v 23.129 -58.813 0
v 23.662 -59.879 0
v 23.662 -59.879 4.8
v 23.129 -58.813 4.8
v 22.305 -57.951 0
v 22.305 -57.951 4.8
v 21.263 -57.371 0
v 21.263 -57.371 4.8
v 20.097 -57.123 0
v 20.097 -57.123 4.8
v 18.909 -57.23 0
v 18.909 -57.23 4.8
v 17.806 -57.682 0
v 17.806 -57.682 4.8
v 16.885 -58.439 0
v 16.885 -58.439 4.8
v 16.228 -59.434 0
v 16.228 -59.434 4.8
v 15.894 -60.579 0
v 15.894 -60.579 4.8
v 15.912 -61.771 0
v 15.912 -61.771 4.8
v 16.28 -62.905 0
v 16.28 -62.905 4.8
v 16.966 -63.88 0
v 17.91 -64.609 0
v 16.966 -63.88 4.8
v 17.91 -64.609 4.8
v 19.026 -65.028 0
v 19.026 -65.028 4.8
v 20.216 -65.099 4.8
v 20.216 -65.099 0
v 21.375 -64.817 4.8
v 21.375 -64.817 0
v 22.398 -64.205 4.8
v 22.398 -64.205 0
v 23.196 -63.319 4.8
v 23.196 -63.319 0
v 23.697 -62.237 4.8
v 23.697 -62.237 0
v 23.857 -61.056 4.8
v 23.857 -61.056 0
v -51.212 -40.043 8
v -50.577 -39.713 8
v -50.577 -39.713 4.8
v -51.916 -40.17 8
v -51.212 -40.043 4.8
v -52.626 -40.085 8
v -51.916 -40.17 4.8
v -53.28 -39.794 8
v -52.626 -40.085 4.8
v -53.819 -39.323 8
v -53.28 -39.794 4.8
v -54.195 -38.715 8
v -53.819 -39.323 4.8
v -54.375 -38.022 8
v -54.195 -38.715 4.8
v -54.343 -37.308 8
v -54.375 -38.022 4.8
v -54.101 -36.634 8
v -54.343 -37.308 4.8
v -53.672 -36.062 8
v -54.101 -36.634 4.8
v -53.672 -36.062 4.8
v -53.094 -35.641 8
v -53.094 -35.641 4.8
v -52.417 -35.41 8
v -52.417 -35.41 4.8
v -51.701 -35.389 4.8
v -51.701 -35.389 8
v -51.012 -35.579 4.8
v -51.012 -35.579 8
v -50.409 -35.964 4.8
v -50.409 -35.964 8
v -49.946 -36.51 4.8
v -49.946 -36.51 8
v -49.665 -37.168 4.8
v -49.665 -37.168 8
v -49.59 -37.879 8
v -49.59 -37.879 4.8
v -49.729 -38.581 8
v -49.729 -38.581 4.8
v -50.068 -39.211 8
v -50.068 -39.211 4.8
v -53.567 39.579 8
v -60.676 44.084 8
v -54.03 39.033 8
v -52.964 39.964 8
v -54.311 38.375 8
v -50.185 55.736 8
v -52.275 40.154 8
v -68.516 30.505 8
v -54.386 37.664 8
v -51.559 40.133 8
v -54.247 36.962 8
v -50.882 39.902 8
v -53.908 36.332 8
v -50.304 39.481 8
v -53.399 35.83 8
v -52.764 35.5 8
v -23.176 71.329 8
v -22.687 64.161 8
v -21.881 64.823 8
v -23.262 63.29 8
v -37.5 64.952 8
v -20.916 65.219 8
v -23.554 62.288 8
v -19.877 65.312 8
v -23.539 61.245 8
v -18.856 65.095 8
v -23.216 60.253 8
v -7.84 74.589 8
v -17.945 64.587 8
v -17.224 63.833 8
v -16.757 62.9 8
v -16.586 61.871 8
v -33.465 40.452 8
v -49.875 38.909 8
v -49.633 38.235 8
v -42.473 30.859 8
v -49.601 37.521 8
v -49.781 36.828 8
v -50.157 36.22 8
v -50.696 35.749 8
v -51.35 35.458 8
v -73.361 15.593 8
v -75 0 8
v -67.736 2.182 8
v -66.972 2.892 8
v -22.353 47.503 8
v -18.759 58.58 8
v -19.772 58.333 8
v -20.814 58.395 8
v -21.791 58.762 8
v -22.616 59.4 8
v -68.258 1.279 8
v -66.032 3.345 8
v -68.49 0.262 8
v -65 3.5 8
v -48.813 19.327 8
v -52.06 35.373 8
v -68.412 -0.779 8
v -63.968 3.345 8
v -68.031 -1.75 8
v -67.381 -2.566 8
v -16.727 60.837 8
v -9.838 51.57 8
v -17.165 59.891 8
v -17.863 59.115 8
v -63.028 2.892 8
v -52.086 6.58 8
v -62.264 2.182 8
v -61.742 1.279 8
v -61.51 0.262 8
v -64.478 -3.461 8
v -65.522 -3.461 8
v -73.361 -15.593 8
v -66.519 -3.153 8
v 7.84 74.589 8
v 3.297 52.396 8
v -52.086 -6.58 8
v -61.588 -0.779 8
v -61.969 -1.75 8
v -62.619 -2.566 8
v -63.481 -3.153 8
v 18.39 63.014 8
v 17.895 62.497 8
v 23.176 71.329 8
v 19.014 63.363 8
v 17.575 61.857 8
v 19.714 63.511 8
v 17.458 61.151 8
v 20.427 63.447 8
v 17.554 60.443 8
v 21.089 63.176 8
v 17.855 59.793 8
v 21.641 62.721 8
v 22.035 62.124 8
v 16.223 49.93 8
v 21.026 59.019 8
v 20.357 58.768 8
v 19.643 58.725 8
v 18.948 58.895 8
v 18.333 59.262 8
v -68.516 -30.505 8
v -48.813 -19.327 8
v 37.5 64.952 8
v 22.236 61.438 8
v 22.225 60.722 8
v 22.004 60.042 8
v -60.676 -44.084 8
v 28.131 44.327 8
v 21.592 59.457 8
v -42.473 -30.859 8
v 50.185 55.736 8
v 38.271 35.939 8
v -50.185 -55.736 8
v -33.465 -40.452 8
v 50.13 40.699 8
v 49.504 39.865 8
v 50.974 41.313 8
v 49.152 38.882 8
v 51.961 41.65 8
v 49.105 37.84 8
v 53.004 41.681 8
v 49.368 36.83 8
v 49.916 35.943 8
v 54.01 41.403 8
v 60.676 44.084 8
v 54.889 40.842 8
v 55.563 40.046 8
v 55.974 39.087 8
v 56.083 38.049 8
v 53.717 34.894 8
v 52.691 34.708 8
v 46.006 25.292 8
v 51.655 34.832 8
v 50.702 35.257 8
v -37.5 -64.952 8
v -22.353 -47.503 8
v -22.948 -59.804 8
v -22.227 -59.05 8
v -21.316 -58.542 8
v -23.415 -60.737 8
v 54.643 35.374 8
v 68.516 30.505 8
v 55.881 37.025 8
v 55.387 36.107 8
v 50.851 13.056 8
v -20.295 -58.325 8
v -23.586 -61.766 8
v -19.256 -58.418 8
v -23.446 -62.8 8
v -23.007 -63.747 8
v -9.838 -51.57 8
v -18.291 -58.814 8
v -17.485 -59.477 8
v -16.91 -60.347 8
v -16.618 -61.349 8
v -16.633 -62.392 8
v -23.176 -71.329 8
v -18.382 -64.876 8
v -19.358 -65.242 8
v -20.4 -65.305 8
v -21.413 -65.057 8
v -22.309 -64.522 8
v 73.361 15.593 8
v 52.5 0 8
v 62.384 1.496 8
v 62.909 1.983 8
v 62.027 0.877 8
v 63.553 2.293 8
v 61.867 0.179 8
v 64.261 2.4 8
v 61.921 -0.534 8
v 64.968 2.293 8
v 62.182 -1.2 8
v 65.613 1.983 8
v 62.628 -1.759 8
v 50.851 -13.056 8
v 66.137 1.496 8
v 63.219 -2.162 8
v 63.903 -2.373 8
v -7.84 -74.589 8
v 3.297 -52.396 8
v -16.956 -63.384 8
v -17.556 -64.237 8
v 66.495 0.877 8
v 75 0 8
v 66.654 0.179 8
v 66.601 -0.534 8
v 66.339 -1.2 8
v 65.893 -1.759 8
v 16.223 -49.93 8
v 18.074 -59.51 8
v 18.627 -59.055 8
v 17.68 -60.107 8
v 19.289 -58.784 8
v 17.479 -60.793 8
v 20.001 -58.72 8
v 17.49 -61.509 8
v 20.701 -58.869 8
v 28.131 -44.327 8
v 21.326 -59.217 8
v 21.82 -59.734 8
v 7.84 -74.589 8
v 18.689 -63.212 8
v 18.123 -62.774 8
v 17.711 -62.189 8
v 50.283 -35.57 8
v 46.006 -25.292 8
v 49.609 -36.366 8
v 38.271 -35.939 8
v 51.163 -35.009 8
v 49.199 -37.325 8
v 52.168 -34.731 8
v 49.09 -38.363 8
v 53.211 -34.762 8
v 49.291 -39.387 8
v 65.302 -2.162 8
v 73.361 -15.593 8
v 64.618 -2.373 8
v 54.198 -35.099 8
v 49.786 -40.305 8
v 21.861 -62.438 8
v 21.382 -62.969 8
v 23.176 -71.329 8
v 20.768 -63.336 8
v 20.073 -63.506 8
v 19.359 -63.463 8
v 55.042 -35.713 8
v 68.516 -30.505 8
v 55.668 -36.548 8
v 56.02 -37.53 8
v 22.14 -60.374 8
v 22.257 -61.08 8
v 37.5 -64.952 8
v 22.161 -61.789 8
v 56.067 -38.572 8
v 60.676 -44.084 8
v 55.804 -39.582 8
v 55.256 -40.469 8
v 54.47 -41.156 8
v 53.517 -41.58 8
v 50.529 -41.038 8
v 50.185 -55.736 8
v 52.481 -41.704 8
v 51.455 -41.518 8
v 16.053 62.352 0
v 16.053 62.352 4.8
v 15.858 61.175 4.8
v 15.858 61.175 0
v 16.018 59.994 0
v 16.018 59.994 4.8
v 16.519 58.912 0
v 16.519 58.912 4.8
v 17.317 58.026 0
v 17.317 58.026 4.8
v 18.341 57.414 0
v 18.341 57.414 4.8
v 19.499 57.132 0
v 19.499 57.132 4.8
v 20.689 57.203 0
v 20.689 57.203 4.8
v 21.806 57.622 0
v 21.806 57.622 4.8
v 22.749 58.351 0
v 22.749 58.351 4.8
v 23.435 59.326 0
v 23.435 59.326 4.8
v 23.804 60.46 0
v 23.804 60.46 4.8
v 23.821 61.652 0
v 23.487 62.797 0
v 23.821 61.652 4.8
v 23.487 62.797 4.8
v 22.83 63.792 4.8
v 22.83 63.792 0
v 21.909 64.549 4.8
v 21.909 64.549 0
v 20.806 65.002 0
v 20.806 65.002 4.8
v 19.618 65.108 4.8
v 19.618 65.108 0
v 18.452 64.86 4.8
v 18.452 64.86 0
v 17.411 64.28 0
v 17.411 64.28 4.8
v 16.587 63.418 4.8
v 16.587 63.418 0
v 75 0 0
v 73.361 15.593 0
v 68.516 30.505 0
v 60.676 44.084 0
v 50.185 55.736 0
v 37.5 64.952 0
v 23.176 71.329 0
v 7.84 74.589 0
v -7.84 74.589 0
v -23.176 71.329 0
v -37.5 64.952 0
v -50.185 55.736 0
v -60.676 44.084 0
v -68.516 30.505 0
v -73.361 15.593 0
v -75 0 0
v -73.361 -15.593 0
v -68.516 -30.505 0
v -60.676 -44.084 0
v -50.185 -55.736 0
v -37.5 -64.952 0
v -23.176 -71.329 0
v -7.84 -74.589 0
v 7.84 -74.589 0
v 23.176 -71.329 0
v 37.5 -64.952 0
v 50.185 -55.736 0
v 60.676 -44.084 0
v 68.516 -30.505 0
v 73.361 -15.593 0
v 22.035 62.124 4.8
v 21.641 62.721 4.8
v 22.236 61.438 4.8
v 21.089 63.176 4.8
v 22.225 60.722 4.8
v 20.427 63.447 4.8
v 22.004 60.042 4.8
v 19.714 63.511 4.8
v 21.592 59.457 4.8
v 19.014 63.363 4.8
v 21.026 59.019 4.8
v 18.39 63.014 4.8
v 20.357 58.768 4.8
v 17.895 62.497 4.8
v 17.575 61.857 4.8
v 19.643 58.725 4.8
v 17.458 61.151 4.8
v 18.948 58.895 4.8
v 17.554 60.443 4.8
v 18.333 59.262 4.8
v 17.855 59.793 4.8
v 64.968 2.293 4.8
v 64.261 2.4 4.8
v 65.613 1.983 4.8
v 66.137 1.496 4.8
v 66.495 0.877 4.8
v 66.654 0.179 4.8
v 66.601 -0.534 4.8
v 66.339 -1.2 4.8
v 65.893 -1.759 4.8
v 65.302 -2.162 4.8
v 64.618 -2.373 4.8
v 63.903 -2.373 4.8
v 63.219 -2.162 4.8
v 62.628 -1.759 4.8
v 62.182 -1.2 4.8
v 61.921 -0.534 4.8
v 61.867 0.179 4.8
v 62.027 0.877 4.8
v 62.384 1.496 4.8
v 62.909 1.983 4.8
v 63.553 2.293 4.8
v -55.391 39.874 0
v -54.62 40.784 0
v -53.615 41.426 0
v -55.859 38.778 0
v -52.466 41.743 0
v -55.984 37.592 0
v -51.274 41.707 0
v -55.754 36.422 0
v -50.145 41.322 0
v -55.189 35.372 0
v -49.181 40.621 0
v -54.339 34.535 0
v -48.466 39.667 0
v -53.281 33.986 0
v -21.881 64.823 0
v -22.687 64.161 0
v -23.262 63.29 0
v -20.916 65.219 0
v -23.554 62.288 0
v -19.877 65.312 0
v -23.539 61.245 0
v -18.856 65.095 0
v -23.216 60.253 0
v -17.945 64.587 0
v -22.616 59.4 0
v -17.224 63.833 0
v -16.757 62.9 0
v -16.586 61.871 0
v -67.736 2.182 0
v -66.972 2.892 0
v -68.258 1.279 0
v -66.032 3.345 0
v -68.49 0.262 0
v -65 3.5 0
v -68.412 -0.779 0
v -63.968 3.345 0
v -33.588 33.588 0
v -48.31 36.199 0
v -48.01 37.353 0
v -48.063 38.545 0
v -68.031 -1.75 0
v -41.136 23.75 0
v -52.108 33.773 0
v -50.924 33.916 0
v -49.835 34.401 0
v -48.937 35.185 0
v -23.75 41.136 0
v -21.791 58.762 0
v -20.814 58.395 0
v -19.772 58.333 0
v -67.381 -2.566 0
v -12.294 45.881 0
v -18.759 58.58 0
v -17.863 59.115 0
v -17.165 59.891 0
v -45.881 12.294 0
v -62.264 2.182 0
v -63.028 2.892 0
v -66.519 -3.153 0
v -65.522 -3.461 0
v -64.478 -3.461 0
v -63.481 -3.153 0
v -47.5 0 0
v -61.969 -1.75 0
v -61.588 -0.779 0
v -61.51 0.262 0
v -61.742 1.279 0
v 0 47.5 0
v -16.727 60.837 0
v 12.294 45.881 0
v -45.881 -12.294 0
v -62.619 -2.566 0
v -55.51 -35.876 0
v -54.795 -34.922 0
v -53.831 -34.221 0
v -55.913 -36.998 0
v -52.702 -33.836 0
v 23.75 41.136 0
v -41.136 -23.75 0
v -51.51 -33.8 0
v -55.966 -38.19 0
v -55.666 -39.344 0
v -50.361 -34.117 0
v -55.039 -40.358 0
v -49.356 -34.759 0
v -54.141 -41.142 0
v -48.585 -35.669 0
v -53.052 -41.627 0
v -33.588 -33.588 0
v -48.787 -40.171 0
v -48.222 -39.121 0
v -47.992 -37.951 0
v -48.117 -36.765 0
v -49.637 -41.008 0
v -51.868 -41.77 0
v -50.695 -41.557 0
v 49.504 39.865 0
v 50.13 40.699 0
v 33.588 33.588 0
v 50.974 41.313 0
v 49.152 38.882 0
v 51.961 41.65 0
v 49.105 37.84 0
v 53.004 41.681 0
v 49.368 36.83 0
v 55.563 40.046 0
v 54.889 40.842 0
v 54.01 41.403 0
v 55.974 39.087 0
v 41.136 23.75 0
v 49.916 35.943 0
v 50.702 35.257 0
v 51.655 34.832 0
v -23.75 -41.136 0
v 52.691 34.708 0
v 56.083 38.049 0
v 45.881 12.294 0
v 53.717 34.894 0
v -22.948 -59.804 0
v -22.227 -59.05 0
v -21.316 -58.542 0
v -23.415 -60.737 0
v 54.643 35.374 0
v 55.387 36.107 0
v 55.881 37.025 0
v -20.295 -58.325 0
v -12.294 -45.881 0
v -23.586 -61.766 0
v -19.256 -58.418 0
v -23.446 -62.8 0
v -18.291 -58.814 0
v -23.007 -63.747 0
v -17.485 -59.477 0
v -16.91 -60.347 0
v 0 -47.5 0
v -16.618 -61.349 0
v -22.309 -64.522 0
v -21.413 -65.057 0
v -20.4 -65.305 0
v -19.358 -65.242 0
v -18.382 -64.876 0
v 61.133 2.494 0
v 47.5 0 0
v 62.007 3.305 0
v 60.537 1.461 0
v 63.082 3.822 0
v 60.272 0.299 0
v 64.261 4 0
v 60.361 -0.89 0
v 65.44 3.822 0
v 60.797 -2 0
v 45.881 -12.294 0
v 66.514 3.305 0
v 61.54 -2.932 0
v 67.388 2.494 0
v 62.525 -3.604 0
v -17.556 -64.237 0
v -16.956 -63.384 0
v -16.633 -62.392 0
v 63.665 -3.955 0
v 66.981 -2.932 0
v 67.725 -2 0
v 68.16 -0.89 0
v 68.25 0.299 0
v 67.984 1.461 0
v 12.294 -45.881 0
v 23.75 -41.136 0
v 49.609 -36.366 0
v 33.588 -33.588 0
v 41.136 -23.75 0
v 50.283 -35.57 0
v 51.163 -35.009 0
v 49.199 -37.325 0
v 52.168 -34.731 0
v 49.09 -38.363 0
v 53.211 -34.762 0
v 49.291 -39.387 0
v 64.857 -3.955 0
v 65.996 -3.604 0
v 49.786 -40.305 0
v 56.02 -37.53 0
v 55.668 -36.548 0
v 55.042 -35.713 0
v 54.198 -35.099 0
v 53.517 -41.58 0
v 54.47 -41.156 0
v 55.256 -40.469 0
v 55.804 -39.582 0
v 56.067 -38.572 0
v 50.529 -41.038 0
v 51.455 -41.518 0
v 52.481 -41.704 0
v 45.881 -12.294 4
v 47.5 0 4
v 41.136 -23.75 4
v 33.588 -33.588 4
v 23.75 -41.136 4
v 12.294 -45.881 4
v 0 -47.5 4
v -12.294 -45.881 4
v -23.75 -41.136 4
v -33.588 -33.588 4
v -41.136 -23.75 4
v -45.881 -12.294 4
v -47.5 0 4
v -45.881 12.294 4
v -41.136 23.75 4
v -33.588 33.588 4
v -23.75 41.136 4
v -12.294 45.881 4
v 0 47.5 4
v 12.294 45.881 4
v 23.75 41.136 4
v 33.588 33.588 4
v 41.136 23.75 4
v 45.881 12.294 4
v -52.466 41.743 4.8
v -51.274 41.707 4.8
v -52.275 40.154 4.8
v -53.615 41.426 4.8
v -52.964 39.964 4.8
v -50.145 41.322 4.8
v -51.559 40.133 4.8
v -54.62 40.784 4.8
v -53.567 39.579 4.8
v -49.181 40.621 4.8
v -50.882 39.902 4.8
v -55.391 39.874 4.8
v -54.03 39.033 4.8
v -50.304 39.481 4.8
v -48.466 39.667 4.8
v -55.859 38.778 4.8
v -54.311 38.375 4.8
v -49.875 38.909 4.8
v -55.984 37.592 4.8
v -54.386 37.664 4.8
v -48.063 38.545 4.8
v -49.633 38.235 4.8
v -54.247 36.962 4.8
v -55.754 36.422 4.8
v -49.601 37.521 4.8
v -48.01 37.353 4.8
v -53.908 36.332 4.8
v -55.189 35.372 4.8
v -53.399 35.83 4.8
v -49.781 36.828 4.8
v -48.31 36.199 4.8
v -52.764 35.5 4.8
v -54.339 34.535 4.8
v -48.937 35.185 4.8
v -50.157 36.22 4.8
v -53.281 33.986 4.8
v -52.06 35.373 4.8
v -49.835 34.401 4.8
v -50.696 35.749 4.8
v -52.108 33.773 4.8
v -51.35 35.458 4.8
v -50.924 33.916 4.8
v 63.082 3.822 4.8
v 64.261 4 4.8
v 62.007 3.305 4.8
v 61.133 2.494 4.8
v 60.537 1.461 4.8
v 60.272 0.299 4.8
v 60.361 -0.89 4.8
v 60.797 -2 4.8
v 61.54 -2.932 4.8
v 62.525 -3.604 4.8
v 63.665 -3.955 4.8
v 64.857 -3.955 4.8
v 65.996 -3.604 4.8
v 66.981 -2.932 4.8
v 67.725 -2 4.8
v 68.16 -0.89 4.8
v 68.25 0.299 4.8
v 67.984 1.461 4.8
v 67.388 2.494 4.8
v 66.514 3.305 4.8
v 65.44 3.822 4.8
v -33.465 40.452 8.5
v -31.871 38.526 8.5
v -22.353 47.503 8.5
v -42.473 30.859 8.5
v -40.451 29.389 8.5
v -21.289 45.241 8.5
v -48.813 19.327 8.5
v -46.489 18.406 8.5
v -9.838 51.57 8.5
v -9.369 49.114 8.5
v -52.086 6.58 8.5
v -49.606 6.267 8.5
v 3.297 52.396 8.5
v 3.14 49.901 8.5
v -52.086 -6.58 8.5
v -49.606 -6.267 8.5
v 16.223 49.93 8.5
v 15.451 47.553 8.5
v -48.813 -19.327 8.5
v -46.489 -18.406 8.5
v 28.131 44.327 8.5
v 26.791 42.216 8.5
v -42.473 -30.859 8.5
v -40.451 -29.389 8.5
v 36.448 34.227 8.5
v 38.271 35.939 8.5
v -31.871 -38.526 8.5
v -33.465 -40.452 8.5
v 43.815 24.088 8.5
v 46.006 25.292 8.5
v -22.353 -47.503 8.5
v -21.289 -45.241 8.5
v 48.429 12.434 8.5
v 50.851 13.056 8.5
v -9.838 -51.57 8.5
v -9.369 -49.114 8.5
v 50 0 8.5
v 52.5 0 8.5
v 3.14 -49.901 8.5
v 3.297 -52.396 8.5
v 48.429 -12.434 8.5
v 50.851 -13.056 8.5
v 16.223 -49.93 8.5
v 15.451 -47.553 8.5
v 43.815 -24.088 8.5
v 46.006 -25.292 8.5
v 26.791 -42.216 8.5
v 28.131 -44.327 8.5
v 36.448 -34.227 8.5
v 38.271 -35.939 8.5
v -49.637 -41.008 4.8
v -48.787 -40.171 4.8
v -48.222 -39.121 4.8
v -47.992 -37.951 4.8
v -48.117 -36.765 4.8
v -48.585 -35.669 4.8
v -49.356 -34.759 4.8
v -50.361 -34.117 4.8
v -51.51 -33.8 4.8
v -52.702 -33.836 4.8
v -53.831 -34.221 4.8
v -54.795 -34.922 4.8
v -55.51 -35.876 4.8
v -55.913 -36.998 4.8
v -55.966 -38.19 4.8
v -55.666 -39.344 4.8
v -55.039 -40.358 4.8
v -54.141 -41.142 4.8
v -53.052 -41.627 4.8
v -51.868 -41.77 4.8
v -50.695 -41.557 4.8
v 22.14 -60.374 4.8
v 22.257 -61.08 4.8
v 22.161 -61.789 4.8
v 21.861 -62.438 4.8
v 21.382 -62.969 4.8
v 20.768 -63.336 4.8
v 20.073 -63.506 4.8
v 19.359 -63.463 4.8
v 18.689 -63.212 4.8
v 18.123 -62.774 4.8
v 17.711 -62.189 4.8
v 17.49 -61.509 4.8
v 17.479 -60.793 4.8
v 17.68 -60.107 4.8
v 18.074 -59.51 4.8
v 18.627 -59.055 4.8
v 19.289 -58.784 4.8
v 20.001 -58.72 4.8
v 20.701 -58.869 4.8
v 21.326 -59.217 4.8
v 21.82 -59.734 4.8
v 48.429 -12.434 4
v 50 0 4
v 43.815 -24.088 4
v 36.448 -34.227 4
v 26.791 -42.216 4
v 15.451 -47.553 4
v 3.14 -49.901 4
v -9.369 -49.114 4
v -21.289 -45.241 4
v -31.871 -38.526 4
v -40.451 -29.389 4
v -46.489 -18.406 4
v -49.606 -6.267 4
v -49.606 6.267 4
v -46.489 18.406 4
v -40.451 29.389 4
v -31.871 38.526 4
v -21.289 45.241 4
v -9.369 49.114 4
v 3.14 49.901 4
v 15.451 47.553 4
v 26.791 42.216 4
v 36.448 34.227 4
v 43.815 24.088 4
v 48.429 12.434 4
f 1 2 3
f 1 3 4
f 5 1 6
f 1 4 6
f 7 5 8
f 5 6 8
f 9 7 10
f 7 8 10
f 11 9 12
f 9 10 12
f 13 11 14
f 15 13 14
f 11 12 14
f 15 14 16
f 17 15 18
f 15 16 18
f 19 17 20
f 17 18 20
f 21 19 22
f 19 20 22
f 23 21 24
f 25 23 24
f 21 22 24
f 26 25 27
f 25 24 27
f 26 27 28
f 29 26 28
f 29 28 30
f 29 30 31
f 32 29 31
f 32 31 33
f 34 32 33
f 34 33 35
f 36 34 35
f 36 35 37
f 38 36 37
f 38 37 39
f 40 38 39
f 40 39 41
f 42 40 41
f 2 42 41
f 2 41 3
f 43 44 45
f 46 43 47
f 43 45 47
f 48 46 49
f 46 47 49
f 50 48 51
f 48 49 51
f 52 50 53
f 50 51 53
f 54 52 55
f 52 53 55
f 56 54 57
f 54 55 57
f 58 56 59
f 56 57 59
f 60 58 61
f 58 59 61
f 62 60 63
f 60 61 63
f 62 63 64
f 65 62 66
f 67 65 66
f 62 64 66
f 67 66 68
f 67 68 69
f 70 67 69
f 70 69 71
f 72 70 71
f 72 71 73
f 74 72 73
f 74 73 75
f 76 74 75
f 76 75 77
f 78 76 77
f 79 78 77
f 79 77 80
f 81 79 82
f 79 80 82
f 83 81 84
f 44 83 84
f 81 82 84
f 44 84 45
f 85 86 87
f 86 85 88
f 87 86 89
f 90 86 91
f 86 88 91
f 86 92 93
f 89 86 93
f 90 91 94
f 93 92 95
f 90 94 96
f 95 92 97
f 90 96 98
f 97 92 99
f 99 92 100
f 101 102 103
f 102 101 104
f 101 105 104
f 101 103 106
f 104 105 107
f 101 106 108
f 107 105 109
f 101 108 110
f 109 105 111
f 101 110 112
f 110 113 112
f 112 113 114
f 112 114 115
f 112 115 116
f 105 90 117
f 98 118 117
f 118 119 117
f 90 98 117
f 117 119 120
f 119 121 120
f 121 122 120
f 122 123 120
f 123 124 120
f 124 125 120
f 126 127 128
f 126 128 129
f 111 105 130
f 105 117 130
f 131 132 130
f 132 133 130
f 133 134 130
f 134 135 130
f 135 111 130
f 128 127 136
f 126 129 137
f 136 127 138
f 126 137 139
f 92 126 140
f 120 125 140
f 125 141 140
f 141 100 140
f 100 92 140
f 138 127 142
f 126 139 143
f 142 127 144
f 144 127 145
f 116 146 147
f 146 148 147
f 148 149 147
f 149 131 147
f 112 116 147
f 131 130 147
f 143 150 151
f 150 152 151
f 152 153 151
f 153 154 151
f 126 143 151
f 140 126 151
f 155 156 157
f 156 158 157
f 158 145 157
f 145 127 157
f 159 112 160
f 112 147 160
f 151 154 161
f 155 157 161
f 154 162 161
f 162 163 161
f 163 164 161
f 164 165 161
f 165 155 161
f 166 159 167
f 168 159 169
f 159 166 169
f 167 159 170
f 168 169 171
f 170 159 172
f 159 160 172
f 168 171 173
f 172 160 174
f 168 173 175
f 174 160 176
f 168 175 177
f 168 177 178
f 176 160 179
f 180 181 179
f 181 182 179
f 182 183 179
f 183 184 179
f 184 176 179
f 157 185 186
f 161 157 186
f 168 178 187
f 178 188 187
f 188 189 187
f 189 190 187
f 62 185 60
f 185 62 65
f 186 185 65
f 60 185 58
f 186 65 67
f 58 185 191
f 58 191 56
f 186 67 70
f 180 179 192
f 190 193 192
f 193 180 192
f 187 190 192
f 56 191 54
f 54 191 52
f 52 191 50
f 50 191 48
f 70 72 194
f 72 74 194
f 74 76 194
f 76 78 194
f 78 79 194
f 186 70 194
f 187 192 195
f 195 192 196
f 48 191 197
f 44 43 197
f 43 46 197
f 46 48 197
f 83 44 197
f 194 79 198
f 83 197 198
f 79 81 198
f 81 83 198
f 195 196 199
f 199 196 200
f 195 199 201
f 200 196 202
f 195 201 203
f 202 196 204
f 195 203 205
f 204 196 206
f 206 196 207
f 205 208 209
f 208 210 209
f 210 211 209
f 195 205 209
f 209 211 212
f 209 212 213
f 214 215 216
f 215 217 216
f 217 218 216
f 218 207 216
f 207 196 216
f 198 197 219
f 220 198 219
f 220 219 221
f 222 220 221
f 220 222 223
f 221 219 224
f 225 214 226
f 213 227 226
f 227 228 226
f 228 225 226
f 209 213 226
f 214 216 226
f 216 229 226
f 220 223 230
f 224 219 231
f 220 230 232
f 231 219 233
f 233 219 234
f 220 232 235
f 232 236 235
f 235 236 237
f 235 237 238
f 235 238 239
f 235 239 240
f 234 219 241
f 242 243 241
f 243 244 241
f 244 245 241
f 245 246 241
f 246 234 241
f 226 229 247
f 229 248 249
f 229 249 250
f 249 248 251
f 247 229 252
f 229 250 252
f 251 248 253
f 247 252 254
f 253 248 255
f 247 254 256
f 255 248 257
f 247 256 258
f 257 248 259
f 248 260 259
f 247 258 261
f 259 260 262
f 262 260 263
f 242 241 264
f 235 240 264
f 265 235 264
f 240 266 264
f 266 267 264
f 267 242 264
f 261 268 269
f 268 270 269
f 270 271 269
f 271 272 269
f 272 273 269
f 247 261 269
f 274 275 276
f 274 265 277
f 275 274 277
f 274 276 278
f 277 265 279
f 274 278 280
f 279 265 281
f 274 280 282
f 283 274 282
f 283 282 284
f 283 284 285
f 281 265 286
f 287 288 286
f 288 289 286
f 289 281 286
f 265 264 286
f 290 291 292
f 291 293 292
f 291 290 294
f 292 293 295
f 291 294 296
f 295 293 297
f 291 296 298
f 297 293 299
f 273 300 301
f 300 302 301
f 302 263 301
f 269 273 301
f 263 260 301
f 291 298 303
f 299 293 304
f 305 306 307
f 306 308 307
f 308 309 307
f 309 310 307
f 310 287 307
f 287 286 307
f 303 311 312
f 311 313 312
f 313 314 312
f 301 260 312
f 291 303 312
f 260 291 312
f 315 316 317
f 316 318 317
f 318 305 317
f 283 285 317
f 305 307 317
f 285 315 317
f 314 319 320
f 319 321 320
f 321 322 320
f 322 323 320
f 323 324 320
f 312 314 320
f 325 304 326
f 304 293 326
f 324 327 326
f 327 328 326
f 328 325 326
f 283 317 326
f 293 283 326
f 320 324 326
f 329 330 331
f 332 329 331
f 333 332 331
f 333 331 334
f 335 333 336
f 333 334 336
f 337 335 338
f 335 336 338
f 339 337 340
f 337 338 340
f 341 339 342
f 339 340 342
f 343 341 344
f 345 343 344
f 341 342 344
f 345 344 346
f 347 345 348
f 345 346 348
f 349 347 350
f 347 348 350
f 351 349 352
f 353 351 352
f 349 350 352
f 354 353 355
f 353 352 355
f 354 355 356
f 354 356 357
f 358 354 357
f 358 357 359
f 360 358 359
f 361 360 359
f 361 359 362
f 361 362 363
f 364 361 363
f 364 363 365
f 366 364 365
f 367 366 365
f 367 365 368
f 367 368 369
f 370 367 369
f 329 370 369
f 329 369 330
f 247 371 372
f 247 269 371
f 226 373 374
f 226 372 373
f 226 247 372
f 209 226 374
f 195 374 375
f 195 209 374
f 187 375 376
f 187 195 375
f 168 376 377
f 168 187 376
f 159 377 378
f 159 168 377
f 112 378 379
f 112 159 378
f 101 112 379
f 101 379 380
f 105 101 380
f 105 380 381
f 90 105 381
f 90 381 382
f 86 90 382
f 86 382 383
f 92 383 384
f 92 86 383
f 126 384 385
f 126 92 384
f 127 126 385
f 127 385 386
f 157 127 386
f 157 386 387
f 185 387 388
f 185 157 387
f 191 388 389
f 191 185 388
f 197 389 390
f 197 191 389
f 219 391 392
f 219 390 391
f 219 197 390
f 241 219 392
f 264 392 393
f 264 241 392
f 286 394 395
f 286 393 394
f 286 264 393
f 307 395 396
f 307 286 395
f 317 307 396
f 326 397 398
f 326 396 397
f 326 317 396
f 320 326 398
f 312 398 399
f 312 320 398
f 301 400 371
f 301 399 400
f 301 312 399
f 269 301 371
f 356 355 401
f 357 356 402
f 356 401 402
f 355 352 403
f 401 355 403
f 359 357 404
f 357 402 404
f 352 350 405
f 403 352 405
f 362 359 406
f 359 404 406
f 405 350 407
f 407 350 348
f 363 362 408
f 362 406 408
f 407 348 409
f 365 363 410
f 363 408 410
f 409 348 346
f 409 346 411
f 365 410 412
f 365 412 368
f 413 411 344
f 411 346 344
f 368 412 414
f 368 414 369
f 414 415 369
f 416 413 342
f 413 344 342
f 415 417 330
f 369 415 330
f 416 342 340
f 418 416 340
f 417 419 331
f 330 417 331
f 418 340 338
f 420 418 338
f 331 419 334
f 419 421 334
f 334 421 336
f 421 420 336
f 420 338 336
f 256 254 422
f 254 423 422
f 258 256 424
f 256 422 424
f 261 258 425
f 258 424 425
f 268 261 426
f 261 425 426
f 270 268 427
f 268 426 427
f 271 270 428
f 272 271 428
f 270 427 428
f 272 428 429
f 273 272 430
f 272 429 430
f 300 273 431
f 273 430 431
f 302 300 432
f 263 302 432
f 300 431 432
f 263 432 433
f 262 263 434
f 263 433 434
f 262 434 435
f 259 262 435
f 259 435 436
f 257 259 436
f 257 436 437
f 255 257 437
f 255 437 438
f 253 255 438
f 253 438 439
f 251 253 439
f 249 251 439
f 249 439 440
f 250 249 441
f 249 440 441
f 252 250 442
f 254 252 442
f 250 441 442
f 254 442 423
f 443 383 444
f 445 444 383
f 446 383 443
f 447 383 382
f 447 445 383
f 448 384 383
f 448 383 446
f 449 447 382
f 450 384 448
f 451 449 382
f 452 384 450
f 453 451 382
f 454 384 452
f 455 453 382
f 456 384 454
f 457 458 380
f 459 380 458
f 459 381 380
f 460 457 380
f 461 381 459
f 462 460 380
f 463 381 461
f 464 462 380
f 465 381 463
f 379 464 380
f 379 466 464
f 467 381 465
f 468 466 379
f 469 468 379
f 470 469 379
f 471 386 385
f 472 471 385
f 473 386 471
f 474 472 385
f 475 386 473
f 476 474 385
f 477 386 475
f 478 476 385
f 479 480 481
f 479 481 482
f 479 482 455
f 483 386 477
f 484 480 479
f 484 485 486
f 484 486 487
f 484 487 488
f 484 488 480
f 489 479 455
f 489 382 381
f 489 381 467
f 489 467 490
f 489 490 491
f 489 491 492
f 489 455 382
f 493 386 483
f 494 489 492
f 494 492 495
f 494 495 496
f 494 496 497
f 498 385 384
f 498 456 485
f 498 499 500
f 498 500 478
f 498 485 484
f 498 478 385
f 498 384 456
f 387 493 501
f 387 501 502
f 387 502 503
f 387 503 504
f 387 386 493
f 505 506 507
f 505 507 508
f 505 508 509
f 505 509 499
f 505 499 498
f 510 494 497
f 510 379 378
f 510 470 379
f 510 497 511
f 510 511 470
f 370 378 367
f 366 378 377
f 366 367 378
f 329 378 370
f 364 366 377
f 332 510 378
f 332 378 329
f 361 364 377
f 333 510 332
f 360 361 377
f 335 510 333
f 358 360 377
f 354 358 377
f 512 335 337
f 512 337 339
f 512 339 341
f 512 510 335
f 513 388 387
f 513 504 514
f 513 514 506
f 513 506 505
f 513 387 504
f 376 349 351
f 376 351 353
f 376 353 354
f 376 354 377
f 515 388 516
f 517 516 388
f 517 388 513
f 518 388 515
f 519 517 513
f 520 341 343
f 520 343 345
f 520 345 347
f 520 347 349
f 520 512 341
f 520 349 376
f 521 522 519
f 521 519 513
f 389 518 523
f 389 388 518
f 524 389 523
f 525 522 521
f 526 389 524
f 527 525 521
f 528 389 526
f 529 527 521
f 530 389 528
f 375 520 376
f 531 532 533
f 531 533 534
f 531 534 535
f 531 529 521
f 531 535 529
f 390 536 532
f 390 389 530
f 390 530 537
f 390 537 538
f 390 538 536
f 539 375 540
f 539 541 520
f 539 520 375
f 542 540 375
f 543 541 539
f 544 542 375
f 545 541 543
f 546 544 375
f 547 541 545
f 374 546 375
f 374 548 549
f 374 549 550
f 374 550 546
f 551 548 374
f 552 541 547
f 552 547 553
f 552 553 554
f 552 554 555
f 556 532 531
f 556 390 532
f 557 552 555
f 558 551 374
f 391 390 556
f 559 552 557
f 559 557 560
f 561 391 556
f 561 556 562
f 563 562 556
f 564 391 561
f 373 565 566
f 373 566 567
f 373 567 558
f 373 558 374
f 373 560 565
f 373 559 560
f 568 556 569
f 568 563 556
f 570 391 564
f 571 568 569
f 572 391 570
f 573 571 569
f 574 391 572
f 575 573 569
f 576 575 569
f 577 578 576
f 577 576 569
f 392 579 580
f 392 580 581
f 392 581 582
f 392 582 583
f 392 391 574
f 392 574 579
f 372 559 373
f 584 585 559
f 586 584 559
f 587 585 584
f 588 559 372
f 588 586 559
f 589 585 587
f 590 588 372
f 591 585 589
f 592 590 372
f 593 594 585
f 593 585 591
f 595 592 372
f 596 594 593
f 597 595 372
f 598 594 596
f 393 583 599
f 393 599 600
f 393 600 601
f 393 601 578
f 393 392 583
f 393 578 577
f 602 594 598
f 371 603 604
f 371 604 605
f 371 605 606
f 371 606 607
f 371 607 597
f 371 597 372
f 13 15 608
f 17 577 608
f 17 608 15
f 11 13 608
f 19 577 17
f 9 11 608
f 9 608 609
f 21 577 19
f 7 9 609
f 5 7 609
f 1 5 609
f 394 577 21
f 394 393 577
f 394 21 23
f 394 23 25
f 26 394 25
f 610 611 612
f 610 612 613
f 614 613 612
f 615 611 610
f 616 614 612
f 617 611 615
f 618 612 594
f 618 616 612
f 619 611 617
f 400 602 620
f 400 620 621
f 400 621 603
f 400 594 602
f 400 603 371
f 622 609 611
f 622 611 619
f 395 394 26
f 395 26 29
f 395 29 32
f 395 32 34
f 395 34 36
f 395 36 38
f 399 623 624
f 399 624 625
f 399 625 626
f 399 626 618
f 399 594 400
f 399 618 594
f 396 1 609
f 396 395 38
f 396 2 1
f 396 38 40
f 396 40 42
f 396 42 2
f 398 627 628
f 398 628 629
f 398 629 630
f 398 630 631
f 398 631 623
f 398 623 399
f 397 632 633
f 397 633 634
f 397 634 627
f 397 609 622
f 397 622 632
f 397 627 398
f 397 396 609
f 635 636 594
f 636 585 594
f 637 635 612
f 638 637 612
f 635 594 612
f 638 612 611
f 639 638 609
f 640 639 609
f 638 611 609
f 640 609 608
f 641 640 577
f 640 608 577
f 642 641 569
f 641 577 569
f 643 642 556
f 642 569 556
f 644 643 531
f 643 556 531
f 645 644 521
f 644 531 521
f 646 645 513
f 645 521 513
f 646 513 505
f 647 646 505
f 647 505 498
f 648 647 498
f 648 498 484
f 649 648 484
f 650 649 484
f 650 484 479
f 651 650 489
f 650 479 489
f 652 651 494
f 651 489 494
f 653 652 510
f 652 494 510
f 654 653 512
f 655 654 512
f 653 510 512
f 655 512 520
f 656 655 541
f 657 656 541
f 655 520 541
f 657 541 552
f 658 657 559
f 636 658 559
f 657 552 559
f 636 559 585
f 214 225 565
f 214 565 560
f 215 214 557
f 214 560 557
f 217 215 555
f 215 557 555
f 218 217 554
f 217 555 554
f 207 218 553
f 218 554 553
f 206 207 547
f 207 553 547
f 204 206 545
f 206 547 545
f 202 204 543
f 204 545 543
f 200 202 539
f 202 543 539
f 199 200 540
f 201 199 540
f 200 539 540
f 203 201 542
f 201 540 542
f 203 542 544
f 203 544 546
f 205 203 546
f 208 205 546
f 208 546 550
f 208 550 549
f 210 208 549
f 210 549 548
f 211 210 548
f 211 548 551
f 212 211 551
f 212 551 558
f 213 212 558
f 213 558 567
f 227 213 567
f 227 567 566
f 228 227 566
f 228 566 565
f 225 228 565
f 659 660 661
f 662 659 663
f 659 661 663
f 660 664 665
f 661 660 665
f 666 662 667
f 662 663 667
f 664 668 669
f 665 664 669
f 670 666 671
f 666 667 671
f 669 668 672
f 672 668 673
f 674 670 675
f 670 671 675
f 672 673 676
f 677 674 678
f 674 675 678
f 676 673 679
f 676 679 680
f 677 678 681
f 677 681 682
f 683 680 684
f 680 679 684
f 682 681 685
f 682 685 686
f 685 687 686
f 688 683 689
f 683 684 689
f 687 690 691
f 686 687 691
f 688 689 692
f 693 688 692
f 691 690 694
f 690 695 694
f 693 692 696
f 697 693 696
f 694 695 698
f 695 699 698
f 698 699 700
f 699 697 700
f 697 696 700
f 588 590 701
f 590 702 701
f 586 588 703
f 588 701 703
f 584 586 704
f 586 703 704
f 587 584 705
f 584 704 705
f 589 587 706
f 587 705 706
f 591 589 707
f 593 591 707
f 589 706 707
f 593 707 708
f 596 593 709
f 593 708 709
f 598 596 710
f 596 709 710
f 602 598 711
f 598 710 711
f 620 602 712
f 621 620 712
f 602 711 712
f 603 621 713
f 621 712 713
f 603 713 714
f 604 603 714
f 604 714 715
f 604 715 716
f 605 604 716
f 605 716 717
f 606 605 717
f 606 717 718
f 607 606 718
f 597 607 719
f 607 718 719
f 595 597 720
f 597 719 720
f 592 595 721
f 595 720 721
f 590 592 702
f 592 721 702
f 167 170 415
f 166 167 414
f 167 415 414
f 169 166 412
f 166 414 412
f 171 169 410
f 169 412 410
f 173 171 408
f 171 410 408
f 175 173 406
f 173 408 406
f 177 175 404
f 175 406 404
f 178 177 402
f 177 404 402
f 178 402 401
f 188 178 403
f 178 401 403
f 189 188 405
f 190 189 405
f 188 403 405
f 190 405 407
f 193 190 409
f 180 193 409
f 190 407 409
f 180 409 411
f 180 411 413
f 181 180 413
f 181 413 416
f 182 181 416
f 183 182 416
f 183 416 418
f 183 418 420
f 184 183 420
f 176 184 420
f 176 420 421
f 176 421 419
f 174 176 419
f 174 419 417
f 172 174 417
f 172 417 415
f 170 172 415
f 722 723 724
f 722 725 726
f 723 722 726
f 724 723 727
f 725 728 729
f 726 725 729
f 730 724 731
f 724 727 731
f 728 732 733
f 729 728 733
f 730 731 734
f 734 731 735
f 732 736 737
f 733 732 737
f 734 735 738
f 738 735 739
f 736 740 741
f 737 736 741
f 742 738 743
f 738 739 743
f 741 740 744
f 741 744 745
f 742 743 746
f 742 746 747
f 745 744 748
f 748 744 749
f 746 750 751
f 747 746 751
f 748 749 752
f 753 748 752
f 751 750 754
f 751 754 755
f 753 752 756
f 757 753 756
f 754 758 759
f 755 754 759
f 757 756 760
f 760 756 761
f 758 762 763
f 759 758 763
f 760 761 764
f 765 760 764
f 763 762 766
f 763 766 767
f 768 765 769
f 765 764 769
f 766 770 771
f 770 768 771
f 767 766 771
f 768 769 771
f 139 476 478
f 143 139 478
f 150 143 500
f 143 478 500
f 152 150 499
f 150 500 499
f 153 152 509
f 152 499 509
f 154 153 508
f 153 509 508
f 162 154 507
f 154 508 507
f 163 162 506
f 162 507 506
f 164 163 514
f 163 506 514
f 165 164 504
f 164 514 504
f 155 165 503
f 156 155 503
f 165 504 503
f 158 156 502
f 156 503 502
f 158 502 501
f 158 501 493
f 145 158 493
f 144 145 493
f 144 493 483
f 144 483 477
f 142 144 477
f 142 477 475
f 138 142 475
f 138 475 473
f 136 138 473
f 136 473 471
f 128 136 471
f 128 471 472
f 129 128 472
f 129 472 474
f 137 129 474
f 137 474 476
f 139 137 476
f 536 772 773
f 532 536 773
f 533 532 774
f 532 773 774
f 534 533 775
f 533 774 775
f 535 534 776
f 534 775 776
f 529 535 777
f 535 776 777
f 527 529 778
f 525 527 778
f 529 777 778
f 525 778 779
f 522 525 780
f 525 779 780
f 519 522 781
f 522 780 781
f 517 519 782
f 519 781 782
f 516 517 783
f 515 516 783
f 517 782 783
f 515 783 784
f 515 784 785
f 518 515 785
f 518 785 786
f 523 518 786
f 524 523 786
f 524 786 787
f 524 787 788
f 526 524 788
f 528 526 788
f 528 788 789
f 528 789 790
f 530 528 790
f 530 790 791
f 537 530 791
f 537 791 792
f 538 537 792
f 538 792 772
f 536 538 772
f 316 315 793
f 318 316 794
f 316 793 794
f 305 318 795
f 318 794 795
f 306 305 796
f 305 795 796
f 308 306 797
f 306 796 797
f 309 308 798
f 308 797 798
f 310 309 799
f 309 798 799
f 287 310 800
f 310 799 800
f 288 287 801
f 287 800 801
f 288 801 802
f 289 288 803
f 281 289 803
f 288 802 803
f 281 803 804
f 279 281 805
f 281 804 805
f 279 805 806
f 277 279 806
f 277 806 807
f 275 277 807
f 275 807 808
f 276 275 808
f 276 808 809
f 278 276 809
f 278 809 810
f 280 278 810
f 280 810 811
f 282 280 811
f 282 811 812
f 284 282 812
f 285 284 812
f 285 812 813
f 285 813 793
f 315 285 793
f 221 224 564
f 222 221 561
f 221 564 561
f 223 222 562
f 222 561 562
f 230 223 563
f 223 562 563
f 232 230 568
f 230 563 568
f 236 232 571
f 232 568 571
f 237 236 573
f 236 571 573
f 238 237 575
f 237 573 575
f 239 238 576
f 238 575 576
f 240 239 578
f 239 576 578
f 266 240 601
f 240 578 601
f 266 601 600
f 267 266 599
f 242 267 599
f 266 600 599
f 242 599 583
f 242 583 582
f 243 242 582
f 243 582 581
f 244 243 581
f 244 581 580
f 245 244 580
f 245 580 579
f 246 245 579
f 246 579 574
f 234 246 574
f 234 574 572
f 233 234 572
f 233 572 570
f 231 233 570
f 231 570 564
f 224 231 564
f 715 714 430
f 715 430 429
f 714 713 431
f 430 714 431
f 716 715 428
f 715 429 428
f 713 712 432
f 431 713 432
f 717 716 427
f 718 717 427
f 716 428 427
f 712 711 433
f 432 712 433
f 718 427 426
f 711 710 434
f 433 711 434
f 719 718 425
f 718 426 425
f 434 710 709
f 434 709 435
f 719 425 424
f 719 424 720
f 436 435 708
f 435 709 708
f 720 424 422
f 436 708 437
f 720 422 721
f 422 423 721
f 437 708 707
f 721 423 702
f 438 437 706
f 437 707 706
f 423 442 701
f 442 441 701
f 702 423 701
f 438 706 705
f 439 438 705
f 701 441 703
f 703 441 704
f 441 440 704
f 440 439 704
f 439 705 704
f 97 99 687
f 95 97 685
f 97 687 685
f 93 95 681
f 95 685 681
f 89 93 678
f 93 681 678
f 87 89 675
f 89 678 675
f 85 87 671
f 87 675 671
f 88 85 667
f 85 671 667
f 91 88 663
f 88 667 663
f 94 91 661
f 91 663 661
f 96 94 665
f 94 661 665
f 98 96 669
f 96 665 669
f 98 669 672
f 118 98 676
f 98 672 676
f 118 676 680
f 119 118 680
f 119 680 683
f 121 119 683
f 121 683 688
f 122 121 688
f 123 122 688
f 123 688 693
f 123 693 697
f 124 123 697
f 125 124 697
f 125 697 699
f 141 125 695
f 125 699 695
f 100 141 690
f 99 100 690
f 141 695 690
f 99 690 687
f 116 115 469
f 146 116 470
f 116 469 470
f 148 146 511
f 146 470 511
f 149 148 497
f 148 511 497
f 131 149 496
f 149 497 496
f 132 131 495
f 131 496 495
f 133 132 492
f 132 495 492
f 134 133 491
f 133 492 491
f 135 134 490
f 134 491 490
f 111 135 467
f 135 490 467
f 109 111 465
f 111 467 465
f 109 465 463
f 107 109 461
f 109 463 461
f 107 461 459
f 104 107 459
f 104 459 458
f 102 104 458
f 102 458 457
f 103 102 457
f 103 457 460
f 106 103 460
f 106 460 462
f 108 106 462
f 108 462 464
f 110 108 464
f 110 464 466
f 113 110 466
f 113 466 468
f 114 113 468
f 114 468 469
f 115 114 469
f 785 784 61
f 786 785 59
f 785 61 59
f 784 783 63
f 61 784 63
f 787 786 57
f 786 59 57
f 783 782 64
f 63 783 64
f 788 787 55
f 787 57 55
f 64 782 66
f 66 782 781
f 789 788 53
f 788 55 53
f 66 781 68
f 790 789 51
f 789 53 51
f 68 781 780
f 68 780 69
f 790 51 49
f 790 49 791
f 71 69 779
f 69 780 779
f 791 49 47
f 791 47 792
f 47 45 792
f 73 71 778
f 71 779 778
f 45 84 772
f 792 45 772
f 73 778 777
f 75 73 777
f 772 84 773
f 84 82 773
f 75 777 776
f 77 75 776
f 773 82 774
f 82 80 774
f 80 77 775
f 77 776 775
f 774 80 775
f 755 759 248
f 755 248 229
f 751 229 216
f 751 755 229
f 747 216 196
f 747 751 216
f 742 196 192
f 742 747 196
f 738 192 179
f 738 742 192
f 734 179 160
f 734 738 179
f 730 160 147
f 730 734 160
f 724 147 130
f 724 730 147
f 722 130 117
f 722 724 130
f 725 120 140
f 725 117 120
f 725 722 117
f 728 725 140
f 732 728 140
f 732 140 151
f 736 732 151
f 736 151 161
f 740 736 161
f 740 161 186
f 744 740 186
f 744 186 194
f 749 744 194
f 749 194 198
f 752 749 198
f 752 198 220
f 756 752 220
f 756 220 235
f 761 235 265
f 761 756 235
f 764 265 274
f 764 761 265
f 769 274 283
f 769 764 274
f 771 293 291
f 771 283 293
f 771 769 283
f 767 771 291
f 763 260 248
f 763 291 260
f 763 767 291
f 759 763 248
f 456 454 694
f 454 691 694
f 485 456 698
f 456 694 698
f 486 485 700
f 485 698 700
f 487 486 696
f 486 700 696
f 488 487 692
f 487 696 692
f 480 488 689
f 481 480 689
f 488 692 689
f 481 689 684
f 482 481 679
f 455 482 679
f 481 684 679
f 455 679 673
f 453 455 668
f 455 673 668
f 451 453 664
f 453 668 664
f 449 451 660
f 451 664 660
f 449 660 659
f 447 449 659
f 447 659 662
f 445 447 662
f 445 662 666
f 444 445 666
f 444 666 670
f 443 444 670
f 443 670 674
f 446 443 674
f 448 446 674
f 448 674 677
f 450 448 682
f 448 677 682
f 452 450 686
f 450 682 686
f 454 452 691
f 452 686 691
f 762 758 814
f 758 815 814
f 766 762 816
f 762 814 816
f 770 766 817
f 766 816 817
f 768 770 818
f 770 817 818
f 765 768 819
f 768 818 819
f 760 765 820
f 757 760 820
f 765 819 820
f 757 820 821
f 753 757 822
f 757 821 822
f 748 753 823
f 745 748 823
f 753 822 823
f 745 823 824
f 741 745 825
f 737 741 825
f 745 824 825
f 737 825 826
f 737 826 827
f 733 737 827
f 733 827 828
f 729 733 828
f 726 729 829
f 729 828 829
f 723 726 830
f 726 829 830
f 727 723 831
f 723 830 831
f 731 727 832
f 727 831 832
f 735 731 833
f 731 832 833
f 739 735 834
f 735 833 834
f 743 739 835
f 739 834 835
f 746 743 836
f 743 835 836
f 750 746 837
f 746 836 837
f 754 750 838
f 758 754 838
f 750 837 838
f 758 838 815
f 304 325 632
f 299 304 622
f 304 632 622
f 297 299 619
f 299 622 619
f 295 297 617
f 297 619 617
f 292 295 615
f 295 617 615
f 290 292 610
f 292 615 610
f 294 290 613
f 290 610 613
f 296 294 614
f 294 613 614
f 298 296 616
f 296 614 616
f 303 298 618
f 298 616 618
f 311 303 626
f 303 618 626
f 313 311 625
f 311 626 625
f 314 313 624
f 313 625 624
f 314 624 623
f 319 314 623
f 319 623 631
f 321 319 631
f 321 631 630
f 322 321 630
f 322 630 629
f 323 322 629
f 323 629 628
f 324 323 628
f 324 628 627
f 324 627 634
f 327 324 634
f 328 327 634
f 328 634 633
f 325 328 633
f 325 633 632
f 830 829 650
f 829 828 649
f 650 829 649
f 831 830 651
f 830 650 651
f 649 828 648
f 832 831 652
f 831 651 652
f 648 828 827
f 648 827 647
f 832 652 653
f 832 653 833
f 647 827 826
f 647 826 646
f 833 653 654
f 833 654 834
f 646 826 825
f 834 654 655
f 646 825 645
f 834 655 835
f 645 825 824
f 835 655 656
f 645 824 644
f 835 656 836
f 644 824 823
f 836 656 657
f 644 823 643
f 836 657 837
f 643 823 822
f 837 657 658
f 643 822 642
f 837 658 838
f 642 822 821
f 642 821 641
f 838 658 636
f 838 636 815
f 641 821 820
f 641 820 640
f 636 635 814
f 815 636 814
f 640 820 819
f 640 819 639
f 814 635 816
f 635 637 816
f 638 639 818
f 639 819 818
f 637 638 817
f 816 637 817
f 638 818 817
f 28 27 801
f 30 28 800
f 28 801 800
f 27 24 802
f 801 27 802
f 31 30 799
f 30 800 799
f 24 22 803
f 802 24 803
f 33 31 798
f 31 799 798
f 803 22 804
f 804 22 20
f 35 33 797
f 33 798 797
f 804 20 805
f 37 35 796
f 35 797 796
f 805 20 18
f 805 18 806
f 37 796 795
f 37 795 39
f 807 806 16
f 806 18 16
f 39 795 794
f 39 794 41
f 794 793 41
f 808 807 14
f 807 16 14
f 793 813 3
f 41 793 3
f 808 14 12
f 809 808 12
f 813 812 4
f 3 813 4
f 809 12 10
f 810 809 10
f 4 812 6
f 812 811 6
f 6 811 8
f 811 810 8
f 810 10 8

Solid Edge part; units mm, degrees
sketch "Sketch1" plane through (0, 0, 0) normal (0, -1, 0) x (1, 0, 0)
  line L0 (47.5, 4) -> (47.5, 0)
  line L1 (47.5, 0) -> (75, 0)
  line L2 (75, 0) -> (75, 8)
  line L3 (75, 8) -> (52.5, 8)
  line L4 (52.5, 8) -> (52.5, 8.5)
  line L5 (52.5, 8.5) -> (50, 8.5)
  line L6 (50, 8.5) -> (50, 4)
  line L7 (50, 4) -> (47.5, 4)
  dimension "D1" = 4
  dimension "D2" = 8.5
  dimension "D3" = 8
revolve "RevolvedProtrusion1" add sketch "Sketch1" angle 360 about axis through (0, 0, 54) along (0, 0, -1)
hole "Hole_1" at (64.2607, 0, 0) direction (0, 0, 1) diameter 4.8 end up to next counterbore diameter 8 counterbore depth 4.8
pattern_circular "Pattern1" count 5 over 360 about axis through (0, 0, 8) along (0, 0, 1) of "Hole_1"
hole "Hole_2" at (-65, 0, 0) direction (0, 0, 1) diameter 7 end up to next
pattern_circular "Pattern2" count 5 over 360 about axis through (0, 0, 0) along (0, 0, 1) of "Hole_2"
properties material "Polyethylene, low density"
